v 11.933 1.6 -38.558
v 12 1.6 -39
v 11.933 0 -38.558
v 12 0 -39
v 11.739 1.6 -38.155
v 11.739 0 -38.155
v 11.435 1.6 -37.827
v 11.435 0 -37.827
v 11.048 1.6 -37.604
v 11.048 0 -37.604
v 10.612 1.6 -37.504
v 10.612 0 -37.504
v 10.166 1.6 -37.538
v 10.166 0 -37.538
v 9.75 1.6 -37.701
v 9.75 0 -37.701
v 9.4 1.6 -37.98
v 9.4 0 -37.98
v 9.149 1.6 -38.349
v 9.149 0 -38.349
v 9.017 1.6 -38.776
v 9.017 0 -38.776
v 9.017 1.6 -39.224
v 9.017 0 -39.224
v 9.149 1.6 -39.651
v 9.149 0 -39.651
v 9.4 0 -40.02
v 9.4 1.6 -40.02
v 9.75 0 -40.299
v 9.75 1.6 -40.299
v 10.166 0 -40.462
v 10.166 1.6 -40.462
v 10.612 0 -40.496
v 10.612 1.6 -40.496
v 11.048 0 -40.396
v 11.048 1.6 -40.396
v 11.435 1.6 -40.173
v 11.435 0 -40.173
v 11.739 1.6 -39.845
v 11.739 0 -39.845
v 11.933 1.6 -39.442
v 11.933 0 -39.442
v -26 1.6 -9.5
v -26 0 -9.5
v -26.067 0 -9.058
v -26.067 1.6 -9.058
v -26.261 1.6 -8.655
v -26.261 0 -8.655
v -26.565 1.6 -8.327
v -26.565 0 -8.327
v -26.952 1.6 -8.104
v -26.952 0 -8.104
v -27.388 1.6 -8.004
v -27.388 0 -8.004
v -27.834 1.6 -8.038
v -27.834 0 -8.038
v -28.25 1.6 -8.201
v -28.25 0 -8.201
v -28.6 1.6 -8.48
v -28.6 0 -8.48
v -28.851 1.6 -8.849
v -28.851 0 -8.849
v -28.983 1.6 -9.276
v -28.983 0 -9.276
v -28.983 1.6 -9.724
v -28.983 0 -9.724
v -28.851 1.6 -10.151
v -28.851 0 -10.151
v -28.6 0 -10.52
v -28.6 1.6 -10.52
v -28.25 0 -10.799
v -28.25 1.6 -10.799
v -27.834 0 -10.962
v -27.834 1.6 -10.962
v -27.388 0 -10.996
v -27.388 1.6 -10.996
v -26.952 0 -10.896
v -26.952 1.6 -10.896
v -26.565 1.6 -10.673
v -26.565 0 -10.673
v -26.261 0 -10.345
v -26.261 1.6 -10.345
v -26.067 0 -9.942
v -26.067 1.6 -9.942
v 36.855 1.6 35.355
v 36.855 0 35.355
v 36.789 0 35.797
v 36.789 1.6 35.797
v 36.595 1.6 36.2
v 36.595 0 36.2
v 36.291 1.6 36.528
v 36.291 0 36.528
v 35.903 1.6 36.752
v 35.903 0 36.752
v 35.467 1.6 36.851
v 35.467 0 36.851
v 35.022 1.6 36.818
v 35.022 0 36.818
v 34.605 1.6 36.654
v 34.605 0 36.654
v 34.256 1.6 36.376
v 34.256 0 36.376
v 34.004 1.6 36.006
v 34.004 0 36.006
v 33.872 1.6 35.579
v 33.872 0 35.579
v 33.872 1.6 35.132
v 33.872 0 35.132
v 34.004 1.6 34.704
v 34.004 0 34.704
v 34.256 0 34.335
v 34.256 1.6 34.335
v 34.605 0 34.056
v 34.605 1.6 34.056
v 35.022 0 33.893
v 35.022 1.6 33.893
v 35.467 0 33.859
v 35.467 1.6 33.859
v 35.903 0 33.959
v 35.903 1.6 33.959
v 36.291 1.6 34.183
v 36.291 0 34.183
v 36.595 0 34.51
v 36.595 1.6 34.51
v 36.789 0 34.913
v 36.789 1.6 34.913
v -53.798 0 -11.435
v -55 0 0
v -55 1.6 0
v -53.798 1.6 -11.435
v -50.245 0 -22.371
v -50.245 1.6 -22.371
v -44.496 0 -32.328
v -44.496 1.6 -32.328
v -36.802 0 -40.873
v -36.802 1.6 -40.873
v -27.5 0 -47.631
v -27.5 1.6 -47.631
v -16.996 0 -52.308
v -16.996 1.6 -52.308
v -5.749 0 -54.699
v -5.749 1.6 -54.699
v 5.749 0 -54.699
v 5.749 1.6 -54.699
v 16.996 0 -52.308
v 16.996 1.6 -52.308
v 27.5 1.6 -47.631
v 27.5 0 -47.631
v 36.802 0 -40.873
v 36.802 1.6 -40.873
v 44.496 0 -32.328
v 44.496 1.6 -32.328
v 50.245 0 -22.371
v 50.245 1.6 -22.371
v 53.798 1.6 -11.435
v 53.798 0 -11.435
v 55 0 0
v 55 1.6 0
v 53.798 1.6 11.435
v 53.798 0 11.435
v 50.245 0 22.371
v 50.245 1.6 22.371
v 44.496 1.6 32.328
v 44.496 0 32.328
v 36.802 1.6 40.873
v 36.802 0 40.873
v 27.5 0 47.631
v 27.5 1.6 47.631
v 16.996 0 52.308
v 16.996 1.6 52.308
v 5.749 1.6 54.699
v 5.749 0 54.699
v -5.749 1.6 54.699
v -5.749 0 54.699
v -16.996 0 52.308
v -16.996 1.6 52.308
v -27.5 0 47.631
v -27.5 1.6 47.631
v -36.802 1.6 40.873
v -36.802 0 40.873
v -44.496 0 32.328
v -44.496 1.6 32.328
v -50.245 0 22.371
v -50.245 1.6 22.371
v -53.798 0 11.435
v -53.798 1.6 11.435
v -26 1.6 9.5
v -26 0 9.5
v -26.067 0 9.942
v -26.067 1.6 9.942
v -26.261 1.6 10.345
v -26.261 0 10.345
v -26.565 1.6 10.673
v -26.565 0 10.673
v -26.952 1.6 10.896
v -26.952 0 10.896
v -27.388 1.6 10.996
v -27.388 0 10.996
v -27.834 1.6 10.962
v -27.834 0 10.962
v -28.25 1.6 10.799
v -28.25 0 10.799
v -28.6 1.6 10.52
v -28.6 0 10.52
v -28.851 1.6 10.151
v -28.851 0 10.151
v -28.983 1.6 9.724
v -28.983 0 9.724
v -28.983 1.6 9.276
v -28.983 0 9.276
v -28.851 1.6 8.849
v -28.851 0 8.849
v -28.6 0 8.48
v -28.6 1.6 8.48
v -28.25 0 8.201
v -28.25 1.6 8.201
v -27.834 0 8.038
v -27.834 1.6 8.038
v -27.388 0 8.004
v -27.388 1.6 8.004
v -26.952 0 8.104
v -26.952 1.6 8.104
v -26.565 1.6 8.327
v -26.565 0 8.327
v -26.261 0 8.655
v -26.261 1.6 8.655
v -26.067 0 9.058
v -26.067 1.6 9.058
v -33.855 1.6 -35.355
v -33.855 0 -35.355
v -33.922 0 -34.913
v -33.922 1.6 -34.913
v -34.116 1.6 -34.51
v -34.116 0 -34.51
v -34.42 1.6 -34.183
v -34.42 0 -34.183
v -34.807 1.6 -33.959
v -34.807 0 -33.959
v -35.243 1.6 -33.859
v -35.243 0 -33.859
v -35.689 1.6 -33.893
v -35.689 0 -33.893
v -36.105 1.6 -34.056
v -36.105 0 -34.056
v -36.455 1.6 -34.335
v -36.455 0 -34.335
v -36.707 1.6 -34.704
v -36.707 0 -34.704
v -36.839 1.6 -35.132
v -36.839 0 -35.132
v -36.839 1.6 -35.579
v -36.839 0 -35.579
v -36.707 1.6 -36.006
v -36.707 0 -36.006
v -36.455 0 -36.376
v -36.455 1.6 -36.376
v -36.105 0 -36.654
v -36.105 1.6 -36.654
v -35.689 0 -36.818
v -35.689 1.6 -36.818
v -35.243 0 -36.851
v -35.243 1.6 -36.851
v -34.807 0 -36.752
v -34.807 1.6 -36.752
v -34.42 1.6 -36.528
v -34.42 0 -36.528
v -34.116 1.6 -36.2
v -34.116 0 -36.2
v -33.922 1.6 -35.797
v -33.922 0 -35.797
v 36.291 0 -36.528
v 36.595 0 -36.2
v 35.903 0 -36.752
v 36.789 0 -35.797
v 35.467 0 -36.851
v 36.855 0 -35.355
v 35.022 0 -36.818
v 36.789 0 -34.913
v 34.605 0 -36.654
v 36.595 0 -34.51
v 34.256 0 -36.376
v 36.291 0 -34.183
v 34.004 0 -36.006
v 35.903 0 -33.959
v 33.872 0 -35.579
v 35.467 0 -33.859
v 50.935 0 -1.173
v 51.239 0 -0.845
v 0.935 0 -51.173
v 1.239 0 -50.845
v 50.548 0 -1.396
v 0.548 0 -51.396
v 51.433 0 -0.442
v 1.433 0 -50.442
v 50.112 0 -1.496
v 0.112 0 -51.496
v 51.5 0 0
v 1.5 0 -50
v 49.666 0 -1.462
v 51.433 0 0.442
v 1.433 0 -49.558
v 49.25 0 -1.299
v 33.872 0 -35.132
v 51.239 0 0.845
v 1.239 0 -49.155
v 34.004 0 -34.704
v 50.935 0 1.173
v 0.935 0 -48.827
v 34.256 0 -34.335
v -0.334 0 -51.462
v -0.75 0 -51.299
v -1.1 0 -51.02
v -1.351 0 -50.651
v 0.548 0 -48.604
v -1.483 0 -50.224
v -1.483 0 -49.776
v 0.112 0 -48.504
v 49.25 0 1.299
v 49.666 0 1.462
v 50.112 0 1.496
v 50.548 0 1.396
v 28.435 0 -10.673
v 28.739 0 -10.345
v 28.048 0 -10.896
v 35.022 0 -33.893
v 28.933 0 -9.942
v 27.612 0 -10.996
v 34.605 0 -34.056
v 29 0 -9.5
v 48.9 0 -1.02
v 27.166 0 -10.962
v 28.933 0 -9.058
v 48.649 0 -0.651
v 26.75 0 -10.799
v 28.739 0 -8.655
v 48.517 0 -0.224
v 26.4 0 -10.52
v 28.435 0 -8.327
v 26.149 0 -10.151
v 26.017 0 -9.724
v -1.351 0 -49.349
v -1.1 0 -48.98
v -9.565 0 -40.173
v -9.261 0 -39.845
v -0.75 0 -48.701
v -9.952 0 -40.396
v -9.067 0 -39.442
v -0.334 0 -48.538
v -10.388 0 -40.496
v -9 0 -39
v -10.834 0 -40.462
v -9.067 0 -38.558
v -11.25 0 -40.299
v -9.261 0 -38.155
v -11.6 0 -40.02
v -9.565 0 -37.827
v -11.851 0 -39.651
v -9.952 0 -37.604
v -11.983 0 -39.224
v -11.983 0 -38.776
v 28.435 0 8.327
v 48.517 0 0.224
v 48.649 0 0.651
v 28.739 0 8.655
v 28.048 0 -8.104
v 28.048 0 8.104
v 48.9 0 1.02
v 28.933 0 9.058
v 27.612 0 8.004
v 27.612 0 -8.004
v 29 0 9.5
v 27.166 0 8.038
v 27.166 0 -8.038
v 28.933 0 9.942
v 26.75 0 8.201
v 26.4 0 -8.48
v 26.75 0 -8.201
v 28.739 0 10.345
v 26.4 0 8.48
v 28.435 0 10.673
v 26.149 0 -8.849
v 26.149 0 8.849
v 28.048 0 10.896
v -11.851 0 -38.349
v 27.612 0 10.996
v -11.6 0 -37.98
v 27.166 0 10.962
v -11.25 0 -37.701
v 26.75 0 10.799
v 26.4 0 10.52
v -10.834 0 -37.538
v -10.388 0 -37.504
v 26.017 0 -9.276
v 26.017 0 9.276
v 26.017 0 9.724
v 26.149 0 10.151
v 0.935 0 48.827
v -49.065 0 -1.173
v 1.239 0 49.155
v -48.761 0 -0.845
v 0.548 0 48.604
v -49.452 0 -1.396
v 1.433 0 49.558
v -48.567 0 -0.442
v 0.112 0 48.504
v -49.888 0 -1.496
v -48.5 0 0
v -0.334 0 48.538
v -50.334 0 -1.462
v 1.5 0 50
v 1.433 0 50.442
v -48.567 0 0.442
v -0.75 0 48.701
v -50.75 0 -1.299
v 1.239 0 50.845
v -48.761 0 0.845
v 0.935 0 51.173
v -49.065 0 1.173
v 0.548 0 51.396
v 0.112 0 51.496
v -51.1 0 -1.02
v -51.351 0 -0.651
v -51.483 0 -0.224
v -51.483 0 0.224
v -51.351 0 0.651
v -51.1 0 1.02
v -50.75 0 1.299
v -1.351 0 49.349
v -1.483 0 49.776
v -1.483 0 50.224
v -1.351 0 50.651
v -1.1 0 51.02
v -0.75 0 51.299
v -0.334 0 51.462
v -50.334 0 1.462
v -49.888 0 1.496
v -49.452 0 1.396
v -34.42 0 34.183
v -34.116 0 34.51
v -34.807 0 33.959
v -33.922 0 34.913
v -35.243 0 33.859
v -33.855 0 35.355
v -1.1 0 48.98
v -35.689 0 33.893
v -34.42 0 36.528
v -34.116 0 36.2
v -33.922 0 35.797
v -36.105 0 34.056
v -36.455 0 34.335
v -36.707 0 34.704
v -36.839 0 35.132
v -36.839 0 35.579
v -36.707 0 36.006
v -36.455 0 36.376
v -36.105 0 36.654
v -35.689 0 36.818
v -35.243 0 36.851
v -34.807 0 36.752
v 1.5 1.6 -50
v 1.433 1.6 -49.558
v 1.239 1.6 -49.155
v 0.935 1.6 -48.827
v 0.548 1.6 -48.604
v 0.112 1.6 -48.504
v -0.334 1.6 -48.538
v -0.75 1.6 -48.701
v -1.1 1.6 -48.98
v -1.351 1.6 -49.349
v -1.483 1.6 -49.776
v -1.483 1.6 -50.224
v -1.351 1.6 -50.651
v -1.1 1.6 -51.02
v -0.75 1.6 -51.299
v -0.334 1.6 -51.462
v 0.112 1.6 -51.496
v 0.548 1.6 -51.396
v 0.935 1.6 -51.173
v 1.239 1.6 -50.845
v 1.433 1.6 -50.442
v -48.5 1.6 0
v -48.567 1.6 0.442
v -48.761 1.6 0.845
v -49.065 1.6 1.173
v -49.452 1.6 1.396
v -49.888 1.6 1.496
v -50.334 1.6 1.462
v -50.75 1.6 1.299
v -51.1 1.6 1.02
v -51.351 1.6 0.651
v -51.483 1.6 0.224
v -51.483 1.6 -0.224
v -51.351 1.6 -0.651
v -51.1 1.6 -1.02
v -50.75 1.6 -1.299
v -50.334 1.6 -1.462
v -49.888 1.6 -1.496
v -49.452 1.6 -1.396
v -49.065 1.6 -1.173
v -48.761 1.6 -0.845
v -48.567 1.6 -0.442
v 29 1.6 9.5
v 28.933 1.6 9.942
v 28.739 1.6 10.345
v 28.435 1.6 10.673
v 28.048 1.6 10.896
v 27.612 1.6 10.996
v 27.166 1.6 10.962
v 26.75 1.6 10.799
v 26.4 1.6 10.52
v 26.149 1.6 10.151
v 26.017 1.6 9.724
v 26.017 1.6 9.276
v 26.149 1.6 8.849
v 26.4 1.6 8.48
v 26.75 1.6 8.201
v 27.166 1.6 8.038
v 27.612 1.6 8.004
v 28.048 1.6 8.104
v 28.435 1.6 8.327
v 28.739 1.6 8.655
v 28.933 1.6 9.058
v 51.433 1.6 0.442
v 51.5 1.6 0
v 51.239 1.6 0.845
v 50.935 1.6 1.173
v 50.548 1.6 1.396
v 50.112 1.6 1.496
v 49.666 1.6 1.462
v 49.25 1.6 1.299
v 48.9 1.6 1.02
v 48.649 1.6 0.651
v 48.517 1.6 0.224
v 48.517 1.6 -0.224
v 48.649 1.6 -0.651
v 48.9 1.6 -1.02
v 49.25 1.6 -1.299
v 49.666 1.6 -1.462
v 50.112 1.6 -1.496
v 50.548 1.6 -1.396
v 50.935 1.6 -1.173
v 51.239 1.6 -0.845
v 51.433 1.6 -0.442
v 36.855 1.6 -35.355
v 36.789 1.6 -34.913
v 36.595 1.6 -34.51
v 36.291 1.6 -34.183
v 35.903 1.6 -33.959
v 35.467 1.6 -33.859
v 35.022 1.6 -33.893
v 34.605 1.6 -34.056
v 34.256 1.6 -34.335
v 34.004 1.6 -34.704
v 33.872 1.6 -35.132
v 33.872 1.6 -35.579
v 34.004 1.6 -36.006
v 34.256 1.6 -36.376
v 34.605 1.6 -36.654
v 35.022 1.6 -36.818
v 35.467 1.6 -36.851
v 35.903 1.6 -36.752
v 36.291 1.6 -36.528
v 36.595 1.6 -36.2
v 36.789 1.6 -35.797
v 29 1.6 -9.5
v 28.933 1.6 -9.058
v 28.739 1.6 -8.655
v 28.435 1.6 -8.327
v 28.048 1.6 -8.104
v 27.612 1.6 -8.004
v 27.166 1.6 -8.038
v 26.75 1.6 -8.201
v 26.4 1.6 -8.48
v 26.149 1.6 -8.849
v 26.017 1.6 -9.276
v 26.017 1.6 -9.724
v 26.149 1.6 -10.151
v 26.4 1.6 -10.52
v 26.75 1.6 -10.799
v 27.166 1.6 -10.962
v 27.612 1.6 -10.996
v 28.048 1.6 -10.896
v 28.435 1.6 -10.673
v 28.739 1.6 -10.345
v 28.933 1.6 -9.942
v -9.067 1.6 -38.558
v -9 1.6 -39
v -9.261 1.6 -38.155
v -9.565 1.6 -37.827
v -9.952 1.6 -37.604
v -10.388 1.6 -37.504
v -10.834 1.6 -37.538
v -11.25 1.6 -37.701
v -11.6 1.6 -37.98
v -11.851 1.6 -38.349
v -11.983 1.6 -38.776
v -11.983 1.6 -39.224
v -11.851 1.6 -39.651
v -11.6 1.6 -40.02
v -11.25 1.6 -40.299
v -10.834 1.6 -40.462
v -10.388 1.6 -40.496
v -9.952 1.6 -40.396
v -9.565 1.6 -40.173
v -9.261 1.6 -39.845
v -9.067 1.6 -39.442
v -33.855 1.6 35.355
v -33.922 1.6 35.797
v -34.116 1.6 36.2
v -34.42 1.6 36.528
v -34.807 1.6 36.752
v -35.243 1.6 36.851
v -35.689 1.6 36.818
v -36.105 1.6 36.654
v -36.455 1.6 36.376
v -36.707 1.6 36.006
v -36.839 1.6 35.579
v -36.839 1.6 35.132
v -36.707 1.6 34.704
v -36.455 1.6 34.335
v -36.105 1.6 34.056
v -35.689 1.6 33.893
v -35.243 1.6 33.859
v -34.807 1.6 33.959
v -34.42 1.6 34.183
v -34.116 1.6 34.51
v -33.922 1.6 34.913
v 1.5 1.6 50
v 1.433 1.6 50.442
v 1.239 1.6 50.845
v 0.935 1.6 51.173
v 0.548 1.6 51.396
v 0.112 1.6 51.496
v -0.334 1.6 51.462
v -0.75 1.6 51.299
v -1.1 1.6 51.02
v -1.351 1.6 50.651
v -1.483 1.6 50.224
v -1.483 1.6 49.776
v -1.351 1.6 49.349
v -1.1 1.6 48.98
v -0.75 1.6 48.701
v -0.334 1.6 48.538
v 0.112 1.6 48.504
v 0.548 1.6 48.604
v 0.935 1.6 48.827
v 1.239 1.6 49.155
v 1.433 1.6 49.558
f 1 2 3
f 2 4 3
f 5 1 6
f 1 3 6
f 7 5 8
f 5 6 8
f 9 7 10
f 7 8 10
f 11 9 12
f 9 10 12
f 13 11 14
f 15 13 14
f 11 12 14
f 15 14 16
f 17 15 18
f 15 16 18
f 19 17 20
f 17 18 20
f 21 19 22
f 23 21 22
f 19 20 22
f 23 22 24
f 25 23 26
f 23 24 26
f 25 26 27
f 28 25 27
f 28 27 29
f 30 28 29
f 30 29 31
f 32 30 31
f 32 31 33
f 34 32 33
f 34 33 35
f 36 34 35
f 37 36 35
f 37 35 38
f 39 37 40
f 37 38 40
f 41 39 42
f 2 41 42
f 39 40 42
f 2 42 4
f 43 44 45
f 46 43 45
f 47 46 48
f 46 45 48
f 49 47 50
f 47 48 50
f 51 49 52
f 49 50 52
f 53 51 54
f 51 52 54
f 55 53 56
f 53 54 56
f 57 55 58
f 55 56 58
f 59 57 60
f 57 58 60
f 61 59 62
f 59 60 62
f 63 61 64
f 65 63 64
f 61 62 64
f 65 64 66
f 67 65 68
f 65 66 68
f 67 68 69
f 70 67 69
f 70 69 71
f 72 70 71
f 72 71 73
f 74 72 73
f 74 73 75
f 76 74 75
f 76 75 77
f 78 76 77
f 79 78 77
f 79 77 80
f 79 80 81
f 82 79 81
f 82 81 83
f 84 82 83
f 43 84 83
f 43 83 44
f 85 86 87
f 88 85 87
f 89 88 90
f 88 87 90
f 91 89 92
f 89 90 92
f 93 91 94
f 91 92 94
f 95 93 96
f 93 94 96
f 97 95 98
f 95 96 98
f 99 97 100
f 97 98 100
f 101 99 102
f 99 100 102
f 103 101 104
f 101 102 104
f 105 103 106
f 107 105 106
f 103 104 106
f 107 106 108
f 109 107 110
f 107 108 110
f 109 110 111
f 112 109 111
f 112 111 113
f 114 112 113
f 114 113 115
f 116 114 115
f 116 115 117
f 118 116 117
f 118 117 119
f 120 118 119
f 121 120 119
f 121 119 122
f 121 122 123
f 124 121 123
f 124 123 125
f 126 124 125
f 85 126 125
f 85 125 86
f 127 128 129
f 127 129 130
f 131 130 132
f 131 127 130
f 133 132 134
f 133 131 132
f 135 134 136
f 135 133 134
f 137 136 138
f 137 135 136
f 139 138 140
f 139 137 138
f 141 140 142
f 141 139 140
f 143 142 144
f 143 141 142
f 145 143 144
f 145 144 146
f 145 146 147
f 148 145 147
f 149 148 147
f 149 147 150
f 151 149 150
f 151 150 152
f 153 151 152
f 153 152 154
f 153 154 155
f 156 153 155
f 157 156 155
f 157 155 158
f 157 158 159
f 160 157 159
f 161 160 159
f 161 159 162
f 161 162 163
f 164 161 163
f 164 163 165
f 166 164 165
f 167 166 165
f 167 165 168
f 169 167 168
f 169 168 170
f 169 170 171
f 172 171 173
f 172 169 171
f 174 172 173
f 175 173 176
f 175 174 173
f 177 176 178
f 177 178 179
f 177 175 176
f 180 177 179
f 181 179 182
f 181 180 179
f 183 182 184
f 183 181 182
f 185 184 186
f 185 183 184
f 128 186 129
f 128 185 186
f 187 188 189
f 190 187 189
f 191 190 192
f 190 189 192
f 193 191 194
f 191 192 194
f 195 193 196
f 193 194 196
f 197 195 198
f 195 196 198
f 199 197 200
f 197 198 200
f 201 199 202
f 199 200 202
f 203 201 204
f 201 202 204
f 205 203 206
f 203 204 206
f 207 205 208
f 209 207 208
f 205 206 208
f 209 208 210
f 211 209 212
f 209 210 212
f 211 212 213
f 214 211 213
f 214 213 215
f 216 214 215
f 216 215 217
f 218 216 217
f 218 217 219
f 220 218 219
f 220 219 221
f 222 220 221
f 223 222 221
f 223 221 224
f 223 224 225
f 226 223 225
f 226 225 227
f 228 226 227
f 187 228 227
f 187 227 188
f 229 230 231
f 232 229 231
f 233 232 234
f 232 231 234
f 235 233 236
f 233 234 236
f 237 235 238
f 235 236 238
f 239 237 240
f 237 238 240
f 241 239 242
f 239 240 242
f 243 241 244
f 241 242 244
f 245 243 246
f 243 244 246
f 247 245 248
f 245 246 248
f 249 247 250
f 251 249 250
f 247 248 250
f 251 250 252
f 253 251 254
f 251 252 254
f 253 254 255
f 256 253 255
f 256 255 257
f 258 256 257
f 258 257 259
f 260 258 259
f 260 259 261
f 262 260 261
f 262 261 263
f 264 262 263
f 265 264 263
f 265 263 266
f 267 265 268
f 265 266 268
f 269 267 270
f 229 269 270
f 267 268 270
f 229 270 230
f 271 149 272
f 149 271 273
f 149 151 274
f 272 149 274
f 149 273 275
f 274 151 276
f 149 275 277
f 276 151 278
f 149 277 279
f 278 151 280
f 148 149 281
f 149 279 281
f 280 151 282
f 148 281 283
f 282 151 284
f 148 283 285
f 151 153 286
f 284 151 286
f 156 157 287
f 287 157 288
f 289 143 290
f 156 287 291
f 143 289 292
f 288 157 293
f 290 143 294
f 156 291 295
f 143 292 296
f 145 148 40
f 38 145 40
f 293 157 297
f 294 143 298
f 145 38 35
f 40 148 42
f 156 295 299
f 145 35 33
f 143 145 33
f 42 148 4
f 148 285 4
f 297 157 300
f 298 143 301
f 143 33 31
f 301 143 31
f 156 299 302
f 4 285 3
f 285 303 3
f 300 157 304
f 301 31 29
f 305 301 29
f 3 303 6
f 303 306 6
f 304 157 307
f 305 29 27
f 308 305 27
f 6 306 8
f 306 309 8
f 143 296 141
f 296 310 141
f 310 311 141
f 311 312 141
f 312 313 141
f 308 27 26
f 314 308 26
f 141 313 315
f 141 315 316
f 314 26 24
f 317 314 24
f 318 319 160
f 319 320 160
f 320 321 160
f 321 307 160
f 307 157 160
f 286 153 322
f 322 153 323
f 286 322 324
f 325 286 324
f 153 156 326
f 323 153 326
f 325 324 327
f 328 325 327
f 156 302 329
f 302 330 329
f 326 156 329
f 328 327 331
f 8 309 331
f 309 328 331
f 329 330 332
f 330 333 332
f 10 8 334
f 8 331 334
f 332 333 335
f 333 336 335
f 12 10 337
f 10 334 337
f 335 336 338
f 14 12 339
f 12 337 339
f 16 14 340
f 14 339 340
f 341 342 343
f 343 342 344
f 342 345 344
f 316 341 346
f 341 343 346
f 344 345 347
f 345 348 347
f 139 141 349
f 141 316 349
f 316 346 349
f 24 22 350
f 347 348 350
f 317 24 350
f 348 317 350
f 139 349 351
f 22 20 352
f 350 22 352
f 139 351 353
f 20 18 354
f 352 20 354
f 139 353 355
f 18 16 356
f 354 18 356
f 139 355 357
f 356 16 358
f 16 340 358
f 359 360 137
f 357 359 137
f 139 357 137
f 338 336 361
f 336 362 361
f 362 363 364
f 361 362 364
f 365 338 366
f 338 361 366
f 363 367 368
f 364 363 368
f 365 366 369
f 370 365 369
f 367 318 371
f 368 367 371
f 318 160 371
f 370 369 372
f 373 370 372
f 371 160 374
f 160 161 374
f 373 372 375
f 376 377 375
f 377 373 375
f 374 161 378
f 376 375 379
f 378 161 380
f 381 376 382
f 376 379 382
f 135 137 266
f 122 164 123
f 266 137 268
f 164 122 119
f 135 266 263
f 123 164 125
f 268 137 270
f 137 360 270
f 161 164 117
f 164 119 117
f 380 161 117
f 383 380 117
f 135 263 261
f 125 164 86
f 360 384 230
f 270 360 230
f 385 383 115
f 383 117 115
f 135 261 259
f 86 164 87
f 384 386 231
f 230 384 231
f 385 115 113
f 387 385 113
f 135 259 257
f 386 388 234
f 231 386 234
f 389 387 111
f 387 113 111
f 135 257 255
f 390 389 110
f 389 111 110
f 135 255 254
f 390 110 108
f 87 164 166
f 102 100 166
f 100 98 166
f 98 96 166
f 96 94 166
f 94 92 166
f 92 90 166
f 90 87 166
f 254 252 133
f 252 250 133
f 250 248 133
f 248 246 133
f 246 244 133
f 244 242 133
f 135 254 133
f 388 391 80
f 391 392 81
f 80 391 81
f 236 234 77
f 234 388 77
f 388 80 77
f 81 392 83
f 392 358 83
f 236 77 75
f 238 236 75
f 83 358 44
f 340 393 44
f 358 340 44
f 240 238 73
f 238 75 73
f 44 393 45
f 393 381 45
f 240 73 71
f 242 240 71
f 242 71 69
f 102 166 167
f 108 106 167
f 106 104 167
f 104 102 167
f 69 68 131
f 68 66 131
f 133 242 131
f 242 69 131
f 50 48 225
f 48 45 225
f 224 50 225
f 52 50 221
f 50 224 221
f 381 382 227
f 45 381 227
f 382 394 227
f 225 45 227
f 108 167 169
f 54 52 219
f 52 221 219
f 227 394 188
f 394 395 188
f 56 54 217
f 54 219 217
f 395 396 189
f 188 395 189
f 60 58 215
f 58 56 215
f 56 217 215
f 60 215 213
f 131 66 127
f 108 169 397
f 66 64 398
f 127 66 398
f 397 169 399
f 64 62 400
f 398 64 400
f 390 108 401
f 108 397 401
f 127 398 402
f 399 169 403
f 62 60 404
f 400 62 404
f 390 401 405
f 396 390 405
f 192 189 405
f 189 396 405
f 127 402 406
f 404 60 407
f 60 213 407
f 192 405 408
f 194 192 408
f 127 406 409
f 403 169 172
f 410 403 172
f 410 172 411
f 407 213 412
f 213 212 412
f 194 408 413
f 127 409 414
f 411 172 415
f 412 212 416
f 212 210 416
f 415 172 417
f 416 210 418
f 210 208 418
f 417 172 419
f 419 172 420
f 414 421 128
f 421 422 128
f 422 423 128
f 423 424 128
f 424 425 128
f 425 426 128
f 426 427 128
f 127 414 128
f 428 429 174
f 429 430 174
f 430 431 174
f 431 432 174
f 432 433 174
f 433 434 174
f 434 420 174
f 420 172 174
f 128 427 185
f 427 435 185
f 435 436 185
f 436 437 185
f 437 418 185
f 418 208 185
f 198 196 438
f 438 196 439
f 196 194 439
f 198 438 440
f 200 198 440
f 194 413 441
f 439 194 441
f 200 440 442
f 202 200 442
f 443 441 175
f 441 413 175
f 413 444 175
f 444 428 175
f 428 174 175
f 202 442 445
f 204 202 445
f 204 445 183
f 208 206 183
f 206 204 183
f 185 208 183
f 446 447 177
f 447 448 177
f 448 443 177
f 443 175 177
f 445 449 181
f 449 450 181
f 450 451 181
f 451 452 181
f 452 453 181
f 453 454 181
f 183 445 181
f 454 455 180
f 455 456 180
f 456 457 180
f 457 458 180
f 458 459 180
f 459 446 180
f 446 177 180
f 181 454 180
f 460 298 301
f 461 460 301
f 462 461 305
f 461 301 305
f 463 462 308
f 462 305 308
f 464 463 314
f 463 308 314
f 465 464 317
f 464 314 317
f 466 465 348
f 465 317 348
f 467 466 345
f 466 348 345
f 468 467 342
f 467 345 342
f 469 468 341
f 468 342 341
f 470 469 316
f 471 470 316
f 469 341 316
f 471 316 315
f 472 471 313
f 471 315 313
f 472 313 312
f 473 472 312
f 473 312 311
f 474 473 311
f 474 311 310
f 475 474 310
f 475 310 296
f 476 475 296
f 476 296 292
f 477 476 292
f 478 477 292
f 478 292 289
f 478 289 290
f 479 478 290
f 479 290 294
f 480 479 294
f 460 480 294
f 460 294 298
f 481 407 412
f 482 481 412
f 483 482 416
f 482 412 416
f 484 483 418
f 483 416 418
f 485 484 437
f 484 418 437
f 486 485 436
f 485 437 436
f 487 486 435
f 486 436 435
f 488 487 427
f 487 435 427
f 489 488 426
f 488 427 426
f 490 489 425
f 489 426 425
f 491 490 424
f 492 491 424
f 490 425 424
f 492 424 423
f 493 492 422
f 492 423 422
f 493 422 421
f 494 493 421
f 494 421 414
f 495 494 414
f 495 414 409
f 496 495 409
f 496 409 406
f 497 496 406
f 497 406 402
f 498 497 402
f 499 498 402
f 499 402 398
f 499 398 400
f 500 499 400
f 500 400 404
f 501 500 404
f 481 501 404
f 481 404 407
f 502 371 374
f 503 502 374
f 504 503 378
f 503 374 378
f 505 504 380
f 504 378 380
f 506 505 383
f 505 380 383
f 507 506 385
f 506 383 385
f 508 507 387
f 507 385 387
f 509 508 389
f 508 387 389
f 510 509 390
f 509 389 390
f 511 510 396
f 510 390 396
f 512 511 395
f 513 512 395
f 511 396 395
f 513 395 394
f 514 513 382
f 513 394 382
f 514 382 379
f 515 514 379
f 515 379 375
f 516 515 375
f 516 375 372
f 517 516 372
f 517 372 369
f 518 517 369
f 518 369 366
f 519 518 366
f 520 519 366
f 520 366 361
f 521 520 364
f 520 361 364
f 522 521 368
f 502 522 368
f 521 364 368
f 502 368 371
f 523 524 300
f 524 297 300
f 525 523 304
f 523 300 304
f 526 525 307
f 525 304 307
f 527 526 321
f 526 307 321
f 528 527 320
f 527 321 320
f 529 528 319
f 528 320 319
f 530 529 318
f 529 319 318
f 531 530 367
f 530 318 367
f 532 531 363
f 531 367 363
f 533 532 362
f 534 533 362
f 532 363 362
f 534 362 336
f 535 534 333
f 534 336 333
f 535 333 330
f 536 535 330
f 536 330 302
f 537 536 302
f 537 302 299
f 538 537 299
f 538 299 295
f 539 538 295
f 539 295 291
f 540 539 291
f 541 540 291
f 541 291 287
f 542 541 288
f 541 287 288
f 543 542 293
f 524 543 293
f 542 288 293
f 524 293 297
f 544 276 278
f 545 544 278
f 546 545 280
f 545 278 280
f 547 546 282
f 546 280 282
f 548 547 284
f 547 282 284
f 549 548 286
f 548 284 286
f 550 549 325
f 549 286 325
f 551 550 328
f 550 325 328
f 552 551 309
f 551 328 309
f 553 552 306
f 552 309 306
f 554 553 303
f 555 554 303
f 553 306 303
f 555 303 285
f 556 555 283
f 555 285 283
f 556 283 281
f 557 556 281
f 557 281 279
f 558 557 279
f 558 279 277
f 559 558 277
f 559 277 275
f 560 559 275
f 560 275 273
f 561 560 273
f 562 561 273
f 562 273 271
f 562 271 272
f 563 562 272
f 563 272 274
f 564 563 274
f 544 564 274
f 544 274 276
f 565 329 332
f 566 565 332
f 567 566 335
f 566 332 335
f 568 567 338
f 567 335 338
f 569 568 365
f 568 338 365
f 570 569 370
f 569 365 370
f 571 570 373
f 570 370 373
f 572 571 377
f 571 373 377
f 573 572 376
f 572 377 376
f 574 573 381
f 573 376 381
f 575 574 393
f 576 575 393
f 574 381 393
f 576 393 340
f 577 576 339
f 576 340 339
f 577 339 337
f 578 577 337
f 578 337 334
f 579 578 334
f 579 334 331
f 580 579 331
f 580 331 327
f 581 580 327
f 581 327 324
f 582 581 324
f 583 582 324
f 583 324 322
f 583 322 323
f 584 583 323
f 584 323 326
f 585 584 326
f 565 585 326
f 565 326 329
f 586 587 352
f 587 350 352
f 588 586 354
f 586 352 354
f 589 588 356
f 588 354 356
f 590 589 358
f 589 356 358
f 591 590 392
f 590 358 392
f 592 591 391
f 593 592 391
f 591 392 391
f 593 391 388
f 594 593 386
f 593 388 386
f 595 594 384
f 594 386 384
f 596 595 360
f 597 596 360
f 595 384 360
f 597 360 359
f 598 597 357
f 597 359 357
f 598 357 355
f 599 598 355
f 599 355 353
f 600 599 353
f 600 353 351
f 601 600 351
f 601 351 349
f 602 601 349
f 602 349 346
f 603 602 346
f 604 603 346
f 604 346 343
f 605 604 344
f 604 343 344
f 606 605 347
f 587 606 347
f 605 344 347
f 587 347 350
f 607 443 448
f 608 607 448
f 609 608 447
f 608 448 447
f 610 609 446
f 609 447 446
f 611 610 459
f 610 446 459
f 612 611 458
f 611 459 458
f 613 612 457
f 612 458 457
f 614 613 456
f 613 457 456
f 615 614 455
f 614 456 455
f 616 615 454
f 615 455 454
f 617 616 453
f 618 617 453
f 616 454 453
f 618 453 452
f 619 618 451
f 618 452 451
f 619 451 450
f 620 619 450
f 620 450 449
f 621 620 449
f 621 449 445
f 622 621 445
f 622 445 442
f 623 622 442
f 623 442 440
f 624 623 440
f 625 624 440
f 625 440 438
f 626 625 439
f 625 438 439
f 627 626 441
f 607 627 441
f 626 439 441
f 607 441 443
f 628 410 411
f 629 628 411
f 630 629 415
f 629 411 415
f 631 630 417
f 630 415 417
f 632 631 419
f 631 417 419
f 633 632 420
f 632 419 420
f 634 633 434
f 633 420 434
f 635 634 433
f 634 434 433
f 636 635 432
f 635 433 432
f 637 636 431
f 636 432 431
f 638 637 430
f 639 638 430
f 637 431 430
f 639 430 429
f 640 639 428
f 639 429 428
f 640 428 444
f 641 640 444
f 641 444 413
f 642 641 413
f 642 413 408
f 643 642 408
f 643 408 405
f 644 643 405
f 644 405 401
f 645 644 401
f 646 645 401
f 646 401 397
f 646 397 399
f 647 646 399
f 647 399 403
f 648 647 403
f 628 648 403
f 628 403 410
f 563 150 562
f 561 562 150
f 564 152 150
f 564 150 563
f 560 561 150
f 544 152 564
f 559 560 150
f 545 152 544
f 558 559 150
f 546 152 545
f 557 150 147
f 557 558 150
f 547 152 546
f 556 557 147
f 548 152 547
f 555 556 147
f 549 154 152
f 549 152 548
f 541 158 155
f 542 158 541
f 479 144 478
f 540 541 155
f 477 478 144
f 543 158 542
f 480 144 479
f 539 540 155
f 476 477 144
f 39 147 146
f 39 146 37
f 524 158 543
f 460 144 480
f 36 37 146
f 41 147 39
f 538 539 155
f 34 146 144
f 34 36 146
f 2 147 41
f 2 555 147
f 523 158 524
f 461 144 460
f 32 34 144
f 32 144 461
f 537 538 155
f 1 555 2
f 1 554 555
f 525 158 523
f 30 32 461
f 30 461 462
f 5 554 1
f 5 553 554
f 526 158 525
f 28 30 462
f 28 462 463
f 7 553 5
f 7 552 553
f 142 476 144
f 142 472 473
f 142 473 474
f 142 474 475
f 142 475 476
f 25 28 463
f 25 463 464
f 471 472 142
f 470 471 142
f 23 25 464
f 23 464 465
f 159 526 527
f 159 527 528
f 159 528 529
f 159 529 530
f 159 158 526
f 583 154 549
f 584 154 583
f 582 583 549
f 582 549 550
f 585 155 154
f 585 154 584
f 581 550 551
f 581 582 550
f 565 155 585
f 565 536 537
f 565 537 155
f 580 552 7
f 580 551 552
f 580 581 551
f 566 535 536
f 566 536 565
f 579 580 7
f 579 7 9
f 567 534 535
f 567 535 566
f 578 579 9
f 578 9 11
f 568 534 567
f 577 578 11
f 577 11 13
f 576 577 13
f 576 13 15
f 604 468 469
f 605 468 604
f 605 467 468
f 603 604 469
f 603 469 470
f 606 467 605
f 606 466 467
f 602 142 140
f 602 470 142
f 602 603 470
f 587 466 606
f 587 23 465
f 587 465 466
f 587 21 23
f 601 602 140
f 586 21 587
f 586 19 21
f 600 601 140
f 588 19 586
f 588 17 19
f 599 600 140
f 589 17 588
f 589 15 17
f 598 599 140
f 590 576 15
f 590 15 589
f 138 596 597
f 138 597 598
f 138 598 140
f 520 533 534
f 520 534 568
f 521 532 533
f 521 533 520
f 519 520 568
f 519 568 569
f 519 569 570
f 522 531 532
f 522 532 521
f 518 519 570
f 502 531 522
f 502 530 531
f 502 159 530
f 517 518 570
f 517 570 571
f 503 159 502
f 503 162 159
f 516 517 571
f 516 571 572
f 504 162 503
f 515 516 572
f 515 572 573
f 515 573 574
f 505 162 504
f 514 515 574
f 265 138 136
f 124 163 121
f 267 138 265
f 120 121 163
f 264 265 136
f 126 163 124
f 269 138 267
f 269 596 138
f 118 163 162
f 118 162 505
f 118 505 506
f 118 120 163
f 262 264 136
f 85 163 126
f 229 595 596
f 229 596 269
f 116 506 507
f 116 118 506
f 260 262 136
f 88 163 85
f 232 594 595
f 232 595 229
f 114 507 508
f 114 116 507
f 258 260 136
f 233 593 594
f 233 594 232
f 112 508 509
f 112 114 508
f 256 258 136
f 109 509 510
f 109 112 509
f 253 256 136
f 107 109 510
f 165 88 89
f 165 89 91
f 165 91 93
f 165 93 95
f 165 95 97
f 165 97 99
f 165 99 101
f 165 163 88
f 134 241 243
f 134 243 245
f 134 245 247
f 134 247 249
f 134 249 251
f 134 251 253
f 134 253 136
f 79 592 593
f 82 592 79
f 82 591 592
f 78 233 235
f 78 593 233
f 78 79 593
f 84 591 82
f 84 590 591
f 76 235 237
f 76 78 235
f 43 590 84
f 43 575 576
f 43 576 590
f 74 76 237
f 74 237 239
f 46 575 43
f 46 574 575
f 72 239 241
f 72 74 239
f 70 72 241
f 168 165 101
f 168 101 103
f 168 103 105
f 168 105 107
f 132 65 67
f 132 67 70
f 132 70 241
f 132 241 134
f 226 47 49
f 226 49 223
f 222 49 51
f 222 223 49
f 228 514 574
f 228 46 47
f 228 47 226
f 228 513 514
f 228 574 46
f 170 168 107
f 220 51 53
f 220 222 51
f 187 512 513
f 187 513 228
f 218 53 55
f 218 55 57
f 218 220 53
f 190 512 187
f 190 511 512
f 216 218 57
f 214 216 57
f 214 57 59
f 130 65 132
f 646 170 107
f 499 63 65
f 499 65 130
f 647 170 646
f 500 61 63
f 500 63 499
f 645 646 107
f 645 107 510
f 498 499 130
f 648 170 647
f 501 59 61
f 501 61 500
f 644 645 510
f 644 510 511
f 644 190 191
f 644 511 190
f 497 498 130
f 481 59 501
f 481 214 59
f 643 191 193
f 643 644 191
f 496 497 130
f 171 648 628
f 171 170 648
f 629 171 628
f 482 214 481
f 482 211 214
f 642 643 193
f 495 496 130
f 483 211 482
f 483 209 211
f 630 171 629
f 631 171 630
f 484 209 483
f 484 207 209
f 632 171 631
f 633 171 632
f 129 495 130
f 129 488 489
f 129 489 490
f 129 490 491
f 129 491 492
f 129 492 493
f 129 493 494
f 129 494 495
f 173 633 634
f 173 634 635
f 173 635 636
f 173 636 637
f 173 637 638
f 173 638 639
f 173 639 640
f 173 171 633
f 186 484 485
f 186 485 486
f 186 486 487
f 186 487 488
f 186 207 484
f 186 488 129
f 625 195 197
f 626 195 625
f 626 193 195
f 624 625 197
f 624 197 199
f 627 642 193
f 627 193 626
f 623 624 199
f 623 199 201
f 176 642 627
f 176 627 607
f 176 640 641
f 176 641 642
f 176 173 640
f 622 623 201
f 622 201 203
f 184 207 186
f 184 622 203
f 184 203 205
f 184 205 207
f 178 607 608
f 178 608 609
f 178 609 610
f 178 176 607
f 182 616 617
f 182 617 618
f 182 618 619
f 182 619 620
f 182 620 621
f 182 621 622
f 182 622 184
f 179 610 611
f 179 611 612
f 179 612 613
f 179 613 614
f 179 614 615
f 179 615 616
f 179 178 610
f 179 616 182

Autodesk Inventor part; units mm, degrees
ref_plane "YZ Plane" through (0, 0, 0) normal (1, 0, 0) x (0, 1, 0)
ref_plane "XZ Plane" through (0, 0, 0) normal (0, 1, 0) x (-1, 0, 0)
ref_plane "XY Plane" through (0, 0, 0) normal (0, 0, 1) x (1, 0, 0)
sketch "Эскиз1" plane through (0, 0, 0) normal (0, 1, 0) x (-1, 0, 0)
  circle A0 centre (0, 0) radius 55
  line L0 (79.4555, 0) -> (-79.4555, 0)
  line L1 (0, -103.8803) -> (0, 88.3129)
  line L2 (38.15, -21.1) -> (-38.15, -21.1)
  line L3 (-38.15, -21.1) -> (-38.15, 21.1)
  line L4 (-38.15, 21.1) -> (38.15, 21.1)
  line L5 (38.15, 21.1) -> (38.15, -21.1)
  dimension "d0" = 110
  dimension "d60" = 76.3
  dimension "d61" = 42.2
extrude "Выдавливание1" add sketch "Эскиз1" along normal blind 1.6
sketch "Эскиз2" plane through (0, 0, 0) normal (0, -1, 0) x (1, 0, 0)
  circle A0 centre (0, 0) radius 55 projected
  line L0 (0, -103.8803) -> (0, 88.3129)
  line L1 (-79.4555, 0) -> (79.4555, 0) projected
  circle A1 centre (0, 0) radius 50
  circle A2 centre (0, -50) radius 1.5
  circle A3 centre (50, 0) radius 1.5
  circle A4 centre (0, 50) radius 1.5
  circle A5 centre (-50, 0) radius 1.5
  circle A6 centre (35.3553, -35.3553) radius 1.5
  circle A7 centre (50, 0) radius 1.5
  circle A8 centre (35.3553, 35.3553) radius 1.5
  circle A9 centre (0, 50) radius 1.5
  circle A10 centre (-35.3553, 35.3553) radius 1.5
  circle A11 centre (-50, 0) radius 1.5
  circle A12 centre (-35.3553, -35.3553) radius 1.5
  line L2 (38.15, -20) -> (-39.85, -20)
  line L3 (-39.85, -20) -> (-39.85, 20)
  line L4 (-39.85, 20) -> (38.15, 20)
  line L5 (38.15, 20) -> (38.15, -20)
  line L6 (-27.5, 9.5) -> (27.5, 9.5)
  line L7 (27.5, 9.5) -> (27.5, -9.5)
  line L8 (27.5, -9.5) -> (-27.5, -9.5)
  line L9 (-27.5, -9.5) -> (-27.5, 9.5)
  circle A13 centre (27.5, 9.5) radius 1.5
  circle A14 centre (-27.5, 9.5) radius 1.5
  circle A15 centre (-27.5, -9.5) radius 1.5
  circle A16 centre (27.5, -9.5) radius 1.5
  circle A17 centre (0, -50) radius 1.5
  circle A18 centre (-10.5, -39) radius 1.5
  circle A19 centre (10.5, -39) radius 1.5
  point P0 (11.9394, -0.2)
  dimension "d22" = 3
  dimension "d23" = 3
  dimension "d25" = 3
  dimension "d26" = 3
  dimension "d30" = 360
  dimension "d62" = 78
  dimension "d63" = 40
  dimension "d70" = 110
  dimension "d71" = 55
  dimension "d72" = 19
  dimension "d73" = 3
  dimension "d74" = 3
  dimension "d75" = 3
  dimension "d76" = 3
extrude "Выдавливание2" cut sketch "Эскиз2" against normal blind 1.6 contours A3 A1 L1 | L1 A1 A3 | A4 A1 L0 | L0 A1 A4 | A2 A1 L0 | L0 A1 A2 | A1 A3 L1 | L1 A3 A1 | A5 A1 L1 | L1 A1 A5 | A1 A4 L0 | L0 A4 A1 | A1 A2 L0 | L0 A2 A1 | A8 A1 | A1 A8 | A6 A1 | A1 A6 | A1 A5 L1 | L1 A5 A1 | A10 A1 | A1 A10 | A12 A1 | A1 A12
extrude "Выдавливание5" [suppressed]
extrude "Выдавливание6" cut sketch "Эскиз2" against normal blind 10 contours A13 L6 L7 | L7 L6 A13 | A16 L8 L7 | L7 L8 A16 | A14 L9 L6 | L6 L9 A14 | A15 L9 L8 | L8 L9 A15 | A18 | A19
properties part number "pcbCase_last" material "Пластик АБС"
